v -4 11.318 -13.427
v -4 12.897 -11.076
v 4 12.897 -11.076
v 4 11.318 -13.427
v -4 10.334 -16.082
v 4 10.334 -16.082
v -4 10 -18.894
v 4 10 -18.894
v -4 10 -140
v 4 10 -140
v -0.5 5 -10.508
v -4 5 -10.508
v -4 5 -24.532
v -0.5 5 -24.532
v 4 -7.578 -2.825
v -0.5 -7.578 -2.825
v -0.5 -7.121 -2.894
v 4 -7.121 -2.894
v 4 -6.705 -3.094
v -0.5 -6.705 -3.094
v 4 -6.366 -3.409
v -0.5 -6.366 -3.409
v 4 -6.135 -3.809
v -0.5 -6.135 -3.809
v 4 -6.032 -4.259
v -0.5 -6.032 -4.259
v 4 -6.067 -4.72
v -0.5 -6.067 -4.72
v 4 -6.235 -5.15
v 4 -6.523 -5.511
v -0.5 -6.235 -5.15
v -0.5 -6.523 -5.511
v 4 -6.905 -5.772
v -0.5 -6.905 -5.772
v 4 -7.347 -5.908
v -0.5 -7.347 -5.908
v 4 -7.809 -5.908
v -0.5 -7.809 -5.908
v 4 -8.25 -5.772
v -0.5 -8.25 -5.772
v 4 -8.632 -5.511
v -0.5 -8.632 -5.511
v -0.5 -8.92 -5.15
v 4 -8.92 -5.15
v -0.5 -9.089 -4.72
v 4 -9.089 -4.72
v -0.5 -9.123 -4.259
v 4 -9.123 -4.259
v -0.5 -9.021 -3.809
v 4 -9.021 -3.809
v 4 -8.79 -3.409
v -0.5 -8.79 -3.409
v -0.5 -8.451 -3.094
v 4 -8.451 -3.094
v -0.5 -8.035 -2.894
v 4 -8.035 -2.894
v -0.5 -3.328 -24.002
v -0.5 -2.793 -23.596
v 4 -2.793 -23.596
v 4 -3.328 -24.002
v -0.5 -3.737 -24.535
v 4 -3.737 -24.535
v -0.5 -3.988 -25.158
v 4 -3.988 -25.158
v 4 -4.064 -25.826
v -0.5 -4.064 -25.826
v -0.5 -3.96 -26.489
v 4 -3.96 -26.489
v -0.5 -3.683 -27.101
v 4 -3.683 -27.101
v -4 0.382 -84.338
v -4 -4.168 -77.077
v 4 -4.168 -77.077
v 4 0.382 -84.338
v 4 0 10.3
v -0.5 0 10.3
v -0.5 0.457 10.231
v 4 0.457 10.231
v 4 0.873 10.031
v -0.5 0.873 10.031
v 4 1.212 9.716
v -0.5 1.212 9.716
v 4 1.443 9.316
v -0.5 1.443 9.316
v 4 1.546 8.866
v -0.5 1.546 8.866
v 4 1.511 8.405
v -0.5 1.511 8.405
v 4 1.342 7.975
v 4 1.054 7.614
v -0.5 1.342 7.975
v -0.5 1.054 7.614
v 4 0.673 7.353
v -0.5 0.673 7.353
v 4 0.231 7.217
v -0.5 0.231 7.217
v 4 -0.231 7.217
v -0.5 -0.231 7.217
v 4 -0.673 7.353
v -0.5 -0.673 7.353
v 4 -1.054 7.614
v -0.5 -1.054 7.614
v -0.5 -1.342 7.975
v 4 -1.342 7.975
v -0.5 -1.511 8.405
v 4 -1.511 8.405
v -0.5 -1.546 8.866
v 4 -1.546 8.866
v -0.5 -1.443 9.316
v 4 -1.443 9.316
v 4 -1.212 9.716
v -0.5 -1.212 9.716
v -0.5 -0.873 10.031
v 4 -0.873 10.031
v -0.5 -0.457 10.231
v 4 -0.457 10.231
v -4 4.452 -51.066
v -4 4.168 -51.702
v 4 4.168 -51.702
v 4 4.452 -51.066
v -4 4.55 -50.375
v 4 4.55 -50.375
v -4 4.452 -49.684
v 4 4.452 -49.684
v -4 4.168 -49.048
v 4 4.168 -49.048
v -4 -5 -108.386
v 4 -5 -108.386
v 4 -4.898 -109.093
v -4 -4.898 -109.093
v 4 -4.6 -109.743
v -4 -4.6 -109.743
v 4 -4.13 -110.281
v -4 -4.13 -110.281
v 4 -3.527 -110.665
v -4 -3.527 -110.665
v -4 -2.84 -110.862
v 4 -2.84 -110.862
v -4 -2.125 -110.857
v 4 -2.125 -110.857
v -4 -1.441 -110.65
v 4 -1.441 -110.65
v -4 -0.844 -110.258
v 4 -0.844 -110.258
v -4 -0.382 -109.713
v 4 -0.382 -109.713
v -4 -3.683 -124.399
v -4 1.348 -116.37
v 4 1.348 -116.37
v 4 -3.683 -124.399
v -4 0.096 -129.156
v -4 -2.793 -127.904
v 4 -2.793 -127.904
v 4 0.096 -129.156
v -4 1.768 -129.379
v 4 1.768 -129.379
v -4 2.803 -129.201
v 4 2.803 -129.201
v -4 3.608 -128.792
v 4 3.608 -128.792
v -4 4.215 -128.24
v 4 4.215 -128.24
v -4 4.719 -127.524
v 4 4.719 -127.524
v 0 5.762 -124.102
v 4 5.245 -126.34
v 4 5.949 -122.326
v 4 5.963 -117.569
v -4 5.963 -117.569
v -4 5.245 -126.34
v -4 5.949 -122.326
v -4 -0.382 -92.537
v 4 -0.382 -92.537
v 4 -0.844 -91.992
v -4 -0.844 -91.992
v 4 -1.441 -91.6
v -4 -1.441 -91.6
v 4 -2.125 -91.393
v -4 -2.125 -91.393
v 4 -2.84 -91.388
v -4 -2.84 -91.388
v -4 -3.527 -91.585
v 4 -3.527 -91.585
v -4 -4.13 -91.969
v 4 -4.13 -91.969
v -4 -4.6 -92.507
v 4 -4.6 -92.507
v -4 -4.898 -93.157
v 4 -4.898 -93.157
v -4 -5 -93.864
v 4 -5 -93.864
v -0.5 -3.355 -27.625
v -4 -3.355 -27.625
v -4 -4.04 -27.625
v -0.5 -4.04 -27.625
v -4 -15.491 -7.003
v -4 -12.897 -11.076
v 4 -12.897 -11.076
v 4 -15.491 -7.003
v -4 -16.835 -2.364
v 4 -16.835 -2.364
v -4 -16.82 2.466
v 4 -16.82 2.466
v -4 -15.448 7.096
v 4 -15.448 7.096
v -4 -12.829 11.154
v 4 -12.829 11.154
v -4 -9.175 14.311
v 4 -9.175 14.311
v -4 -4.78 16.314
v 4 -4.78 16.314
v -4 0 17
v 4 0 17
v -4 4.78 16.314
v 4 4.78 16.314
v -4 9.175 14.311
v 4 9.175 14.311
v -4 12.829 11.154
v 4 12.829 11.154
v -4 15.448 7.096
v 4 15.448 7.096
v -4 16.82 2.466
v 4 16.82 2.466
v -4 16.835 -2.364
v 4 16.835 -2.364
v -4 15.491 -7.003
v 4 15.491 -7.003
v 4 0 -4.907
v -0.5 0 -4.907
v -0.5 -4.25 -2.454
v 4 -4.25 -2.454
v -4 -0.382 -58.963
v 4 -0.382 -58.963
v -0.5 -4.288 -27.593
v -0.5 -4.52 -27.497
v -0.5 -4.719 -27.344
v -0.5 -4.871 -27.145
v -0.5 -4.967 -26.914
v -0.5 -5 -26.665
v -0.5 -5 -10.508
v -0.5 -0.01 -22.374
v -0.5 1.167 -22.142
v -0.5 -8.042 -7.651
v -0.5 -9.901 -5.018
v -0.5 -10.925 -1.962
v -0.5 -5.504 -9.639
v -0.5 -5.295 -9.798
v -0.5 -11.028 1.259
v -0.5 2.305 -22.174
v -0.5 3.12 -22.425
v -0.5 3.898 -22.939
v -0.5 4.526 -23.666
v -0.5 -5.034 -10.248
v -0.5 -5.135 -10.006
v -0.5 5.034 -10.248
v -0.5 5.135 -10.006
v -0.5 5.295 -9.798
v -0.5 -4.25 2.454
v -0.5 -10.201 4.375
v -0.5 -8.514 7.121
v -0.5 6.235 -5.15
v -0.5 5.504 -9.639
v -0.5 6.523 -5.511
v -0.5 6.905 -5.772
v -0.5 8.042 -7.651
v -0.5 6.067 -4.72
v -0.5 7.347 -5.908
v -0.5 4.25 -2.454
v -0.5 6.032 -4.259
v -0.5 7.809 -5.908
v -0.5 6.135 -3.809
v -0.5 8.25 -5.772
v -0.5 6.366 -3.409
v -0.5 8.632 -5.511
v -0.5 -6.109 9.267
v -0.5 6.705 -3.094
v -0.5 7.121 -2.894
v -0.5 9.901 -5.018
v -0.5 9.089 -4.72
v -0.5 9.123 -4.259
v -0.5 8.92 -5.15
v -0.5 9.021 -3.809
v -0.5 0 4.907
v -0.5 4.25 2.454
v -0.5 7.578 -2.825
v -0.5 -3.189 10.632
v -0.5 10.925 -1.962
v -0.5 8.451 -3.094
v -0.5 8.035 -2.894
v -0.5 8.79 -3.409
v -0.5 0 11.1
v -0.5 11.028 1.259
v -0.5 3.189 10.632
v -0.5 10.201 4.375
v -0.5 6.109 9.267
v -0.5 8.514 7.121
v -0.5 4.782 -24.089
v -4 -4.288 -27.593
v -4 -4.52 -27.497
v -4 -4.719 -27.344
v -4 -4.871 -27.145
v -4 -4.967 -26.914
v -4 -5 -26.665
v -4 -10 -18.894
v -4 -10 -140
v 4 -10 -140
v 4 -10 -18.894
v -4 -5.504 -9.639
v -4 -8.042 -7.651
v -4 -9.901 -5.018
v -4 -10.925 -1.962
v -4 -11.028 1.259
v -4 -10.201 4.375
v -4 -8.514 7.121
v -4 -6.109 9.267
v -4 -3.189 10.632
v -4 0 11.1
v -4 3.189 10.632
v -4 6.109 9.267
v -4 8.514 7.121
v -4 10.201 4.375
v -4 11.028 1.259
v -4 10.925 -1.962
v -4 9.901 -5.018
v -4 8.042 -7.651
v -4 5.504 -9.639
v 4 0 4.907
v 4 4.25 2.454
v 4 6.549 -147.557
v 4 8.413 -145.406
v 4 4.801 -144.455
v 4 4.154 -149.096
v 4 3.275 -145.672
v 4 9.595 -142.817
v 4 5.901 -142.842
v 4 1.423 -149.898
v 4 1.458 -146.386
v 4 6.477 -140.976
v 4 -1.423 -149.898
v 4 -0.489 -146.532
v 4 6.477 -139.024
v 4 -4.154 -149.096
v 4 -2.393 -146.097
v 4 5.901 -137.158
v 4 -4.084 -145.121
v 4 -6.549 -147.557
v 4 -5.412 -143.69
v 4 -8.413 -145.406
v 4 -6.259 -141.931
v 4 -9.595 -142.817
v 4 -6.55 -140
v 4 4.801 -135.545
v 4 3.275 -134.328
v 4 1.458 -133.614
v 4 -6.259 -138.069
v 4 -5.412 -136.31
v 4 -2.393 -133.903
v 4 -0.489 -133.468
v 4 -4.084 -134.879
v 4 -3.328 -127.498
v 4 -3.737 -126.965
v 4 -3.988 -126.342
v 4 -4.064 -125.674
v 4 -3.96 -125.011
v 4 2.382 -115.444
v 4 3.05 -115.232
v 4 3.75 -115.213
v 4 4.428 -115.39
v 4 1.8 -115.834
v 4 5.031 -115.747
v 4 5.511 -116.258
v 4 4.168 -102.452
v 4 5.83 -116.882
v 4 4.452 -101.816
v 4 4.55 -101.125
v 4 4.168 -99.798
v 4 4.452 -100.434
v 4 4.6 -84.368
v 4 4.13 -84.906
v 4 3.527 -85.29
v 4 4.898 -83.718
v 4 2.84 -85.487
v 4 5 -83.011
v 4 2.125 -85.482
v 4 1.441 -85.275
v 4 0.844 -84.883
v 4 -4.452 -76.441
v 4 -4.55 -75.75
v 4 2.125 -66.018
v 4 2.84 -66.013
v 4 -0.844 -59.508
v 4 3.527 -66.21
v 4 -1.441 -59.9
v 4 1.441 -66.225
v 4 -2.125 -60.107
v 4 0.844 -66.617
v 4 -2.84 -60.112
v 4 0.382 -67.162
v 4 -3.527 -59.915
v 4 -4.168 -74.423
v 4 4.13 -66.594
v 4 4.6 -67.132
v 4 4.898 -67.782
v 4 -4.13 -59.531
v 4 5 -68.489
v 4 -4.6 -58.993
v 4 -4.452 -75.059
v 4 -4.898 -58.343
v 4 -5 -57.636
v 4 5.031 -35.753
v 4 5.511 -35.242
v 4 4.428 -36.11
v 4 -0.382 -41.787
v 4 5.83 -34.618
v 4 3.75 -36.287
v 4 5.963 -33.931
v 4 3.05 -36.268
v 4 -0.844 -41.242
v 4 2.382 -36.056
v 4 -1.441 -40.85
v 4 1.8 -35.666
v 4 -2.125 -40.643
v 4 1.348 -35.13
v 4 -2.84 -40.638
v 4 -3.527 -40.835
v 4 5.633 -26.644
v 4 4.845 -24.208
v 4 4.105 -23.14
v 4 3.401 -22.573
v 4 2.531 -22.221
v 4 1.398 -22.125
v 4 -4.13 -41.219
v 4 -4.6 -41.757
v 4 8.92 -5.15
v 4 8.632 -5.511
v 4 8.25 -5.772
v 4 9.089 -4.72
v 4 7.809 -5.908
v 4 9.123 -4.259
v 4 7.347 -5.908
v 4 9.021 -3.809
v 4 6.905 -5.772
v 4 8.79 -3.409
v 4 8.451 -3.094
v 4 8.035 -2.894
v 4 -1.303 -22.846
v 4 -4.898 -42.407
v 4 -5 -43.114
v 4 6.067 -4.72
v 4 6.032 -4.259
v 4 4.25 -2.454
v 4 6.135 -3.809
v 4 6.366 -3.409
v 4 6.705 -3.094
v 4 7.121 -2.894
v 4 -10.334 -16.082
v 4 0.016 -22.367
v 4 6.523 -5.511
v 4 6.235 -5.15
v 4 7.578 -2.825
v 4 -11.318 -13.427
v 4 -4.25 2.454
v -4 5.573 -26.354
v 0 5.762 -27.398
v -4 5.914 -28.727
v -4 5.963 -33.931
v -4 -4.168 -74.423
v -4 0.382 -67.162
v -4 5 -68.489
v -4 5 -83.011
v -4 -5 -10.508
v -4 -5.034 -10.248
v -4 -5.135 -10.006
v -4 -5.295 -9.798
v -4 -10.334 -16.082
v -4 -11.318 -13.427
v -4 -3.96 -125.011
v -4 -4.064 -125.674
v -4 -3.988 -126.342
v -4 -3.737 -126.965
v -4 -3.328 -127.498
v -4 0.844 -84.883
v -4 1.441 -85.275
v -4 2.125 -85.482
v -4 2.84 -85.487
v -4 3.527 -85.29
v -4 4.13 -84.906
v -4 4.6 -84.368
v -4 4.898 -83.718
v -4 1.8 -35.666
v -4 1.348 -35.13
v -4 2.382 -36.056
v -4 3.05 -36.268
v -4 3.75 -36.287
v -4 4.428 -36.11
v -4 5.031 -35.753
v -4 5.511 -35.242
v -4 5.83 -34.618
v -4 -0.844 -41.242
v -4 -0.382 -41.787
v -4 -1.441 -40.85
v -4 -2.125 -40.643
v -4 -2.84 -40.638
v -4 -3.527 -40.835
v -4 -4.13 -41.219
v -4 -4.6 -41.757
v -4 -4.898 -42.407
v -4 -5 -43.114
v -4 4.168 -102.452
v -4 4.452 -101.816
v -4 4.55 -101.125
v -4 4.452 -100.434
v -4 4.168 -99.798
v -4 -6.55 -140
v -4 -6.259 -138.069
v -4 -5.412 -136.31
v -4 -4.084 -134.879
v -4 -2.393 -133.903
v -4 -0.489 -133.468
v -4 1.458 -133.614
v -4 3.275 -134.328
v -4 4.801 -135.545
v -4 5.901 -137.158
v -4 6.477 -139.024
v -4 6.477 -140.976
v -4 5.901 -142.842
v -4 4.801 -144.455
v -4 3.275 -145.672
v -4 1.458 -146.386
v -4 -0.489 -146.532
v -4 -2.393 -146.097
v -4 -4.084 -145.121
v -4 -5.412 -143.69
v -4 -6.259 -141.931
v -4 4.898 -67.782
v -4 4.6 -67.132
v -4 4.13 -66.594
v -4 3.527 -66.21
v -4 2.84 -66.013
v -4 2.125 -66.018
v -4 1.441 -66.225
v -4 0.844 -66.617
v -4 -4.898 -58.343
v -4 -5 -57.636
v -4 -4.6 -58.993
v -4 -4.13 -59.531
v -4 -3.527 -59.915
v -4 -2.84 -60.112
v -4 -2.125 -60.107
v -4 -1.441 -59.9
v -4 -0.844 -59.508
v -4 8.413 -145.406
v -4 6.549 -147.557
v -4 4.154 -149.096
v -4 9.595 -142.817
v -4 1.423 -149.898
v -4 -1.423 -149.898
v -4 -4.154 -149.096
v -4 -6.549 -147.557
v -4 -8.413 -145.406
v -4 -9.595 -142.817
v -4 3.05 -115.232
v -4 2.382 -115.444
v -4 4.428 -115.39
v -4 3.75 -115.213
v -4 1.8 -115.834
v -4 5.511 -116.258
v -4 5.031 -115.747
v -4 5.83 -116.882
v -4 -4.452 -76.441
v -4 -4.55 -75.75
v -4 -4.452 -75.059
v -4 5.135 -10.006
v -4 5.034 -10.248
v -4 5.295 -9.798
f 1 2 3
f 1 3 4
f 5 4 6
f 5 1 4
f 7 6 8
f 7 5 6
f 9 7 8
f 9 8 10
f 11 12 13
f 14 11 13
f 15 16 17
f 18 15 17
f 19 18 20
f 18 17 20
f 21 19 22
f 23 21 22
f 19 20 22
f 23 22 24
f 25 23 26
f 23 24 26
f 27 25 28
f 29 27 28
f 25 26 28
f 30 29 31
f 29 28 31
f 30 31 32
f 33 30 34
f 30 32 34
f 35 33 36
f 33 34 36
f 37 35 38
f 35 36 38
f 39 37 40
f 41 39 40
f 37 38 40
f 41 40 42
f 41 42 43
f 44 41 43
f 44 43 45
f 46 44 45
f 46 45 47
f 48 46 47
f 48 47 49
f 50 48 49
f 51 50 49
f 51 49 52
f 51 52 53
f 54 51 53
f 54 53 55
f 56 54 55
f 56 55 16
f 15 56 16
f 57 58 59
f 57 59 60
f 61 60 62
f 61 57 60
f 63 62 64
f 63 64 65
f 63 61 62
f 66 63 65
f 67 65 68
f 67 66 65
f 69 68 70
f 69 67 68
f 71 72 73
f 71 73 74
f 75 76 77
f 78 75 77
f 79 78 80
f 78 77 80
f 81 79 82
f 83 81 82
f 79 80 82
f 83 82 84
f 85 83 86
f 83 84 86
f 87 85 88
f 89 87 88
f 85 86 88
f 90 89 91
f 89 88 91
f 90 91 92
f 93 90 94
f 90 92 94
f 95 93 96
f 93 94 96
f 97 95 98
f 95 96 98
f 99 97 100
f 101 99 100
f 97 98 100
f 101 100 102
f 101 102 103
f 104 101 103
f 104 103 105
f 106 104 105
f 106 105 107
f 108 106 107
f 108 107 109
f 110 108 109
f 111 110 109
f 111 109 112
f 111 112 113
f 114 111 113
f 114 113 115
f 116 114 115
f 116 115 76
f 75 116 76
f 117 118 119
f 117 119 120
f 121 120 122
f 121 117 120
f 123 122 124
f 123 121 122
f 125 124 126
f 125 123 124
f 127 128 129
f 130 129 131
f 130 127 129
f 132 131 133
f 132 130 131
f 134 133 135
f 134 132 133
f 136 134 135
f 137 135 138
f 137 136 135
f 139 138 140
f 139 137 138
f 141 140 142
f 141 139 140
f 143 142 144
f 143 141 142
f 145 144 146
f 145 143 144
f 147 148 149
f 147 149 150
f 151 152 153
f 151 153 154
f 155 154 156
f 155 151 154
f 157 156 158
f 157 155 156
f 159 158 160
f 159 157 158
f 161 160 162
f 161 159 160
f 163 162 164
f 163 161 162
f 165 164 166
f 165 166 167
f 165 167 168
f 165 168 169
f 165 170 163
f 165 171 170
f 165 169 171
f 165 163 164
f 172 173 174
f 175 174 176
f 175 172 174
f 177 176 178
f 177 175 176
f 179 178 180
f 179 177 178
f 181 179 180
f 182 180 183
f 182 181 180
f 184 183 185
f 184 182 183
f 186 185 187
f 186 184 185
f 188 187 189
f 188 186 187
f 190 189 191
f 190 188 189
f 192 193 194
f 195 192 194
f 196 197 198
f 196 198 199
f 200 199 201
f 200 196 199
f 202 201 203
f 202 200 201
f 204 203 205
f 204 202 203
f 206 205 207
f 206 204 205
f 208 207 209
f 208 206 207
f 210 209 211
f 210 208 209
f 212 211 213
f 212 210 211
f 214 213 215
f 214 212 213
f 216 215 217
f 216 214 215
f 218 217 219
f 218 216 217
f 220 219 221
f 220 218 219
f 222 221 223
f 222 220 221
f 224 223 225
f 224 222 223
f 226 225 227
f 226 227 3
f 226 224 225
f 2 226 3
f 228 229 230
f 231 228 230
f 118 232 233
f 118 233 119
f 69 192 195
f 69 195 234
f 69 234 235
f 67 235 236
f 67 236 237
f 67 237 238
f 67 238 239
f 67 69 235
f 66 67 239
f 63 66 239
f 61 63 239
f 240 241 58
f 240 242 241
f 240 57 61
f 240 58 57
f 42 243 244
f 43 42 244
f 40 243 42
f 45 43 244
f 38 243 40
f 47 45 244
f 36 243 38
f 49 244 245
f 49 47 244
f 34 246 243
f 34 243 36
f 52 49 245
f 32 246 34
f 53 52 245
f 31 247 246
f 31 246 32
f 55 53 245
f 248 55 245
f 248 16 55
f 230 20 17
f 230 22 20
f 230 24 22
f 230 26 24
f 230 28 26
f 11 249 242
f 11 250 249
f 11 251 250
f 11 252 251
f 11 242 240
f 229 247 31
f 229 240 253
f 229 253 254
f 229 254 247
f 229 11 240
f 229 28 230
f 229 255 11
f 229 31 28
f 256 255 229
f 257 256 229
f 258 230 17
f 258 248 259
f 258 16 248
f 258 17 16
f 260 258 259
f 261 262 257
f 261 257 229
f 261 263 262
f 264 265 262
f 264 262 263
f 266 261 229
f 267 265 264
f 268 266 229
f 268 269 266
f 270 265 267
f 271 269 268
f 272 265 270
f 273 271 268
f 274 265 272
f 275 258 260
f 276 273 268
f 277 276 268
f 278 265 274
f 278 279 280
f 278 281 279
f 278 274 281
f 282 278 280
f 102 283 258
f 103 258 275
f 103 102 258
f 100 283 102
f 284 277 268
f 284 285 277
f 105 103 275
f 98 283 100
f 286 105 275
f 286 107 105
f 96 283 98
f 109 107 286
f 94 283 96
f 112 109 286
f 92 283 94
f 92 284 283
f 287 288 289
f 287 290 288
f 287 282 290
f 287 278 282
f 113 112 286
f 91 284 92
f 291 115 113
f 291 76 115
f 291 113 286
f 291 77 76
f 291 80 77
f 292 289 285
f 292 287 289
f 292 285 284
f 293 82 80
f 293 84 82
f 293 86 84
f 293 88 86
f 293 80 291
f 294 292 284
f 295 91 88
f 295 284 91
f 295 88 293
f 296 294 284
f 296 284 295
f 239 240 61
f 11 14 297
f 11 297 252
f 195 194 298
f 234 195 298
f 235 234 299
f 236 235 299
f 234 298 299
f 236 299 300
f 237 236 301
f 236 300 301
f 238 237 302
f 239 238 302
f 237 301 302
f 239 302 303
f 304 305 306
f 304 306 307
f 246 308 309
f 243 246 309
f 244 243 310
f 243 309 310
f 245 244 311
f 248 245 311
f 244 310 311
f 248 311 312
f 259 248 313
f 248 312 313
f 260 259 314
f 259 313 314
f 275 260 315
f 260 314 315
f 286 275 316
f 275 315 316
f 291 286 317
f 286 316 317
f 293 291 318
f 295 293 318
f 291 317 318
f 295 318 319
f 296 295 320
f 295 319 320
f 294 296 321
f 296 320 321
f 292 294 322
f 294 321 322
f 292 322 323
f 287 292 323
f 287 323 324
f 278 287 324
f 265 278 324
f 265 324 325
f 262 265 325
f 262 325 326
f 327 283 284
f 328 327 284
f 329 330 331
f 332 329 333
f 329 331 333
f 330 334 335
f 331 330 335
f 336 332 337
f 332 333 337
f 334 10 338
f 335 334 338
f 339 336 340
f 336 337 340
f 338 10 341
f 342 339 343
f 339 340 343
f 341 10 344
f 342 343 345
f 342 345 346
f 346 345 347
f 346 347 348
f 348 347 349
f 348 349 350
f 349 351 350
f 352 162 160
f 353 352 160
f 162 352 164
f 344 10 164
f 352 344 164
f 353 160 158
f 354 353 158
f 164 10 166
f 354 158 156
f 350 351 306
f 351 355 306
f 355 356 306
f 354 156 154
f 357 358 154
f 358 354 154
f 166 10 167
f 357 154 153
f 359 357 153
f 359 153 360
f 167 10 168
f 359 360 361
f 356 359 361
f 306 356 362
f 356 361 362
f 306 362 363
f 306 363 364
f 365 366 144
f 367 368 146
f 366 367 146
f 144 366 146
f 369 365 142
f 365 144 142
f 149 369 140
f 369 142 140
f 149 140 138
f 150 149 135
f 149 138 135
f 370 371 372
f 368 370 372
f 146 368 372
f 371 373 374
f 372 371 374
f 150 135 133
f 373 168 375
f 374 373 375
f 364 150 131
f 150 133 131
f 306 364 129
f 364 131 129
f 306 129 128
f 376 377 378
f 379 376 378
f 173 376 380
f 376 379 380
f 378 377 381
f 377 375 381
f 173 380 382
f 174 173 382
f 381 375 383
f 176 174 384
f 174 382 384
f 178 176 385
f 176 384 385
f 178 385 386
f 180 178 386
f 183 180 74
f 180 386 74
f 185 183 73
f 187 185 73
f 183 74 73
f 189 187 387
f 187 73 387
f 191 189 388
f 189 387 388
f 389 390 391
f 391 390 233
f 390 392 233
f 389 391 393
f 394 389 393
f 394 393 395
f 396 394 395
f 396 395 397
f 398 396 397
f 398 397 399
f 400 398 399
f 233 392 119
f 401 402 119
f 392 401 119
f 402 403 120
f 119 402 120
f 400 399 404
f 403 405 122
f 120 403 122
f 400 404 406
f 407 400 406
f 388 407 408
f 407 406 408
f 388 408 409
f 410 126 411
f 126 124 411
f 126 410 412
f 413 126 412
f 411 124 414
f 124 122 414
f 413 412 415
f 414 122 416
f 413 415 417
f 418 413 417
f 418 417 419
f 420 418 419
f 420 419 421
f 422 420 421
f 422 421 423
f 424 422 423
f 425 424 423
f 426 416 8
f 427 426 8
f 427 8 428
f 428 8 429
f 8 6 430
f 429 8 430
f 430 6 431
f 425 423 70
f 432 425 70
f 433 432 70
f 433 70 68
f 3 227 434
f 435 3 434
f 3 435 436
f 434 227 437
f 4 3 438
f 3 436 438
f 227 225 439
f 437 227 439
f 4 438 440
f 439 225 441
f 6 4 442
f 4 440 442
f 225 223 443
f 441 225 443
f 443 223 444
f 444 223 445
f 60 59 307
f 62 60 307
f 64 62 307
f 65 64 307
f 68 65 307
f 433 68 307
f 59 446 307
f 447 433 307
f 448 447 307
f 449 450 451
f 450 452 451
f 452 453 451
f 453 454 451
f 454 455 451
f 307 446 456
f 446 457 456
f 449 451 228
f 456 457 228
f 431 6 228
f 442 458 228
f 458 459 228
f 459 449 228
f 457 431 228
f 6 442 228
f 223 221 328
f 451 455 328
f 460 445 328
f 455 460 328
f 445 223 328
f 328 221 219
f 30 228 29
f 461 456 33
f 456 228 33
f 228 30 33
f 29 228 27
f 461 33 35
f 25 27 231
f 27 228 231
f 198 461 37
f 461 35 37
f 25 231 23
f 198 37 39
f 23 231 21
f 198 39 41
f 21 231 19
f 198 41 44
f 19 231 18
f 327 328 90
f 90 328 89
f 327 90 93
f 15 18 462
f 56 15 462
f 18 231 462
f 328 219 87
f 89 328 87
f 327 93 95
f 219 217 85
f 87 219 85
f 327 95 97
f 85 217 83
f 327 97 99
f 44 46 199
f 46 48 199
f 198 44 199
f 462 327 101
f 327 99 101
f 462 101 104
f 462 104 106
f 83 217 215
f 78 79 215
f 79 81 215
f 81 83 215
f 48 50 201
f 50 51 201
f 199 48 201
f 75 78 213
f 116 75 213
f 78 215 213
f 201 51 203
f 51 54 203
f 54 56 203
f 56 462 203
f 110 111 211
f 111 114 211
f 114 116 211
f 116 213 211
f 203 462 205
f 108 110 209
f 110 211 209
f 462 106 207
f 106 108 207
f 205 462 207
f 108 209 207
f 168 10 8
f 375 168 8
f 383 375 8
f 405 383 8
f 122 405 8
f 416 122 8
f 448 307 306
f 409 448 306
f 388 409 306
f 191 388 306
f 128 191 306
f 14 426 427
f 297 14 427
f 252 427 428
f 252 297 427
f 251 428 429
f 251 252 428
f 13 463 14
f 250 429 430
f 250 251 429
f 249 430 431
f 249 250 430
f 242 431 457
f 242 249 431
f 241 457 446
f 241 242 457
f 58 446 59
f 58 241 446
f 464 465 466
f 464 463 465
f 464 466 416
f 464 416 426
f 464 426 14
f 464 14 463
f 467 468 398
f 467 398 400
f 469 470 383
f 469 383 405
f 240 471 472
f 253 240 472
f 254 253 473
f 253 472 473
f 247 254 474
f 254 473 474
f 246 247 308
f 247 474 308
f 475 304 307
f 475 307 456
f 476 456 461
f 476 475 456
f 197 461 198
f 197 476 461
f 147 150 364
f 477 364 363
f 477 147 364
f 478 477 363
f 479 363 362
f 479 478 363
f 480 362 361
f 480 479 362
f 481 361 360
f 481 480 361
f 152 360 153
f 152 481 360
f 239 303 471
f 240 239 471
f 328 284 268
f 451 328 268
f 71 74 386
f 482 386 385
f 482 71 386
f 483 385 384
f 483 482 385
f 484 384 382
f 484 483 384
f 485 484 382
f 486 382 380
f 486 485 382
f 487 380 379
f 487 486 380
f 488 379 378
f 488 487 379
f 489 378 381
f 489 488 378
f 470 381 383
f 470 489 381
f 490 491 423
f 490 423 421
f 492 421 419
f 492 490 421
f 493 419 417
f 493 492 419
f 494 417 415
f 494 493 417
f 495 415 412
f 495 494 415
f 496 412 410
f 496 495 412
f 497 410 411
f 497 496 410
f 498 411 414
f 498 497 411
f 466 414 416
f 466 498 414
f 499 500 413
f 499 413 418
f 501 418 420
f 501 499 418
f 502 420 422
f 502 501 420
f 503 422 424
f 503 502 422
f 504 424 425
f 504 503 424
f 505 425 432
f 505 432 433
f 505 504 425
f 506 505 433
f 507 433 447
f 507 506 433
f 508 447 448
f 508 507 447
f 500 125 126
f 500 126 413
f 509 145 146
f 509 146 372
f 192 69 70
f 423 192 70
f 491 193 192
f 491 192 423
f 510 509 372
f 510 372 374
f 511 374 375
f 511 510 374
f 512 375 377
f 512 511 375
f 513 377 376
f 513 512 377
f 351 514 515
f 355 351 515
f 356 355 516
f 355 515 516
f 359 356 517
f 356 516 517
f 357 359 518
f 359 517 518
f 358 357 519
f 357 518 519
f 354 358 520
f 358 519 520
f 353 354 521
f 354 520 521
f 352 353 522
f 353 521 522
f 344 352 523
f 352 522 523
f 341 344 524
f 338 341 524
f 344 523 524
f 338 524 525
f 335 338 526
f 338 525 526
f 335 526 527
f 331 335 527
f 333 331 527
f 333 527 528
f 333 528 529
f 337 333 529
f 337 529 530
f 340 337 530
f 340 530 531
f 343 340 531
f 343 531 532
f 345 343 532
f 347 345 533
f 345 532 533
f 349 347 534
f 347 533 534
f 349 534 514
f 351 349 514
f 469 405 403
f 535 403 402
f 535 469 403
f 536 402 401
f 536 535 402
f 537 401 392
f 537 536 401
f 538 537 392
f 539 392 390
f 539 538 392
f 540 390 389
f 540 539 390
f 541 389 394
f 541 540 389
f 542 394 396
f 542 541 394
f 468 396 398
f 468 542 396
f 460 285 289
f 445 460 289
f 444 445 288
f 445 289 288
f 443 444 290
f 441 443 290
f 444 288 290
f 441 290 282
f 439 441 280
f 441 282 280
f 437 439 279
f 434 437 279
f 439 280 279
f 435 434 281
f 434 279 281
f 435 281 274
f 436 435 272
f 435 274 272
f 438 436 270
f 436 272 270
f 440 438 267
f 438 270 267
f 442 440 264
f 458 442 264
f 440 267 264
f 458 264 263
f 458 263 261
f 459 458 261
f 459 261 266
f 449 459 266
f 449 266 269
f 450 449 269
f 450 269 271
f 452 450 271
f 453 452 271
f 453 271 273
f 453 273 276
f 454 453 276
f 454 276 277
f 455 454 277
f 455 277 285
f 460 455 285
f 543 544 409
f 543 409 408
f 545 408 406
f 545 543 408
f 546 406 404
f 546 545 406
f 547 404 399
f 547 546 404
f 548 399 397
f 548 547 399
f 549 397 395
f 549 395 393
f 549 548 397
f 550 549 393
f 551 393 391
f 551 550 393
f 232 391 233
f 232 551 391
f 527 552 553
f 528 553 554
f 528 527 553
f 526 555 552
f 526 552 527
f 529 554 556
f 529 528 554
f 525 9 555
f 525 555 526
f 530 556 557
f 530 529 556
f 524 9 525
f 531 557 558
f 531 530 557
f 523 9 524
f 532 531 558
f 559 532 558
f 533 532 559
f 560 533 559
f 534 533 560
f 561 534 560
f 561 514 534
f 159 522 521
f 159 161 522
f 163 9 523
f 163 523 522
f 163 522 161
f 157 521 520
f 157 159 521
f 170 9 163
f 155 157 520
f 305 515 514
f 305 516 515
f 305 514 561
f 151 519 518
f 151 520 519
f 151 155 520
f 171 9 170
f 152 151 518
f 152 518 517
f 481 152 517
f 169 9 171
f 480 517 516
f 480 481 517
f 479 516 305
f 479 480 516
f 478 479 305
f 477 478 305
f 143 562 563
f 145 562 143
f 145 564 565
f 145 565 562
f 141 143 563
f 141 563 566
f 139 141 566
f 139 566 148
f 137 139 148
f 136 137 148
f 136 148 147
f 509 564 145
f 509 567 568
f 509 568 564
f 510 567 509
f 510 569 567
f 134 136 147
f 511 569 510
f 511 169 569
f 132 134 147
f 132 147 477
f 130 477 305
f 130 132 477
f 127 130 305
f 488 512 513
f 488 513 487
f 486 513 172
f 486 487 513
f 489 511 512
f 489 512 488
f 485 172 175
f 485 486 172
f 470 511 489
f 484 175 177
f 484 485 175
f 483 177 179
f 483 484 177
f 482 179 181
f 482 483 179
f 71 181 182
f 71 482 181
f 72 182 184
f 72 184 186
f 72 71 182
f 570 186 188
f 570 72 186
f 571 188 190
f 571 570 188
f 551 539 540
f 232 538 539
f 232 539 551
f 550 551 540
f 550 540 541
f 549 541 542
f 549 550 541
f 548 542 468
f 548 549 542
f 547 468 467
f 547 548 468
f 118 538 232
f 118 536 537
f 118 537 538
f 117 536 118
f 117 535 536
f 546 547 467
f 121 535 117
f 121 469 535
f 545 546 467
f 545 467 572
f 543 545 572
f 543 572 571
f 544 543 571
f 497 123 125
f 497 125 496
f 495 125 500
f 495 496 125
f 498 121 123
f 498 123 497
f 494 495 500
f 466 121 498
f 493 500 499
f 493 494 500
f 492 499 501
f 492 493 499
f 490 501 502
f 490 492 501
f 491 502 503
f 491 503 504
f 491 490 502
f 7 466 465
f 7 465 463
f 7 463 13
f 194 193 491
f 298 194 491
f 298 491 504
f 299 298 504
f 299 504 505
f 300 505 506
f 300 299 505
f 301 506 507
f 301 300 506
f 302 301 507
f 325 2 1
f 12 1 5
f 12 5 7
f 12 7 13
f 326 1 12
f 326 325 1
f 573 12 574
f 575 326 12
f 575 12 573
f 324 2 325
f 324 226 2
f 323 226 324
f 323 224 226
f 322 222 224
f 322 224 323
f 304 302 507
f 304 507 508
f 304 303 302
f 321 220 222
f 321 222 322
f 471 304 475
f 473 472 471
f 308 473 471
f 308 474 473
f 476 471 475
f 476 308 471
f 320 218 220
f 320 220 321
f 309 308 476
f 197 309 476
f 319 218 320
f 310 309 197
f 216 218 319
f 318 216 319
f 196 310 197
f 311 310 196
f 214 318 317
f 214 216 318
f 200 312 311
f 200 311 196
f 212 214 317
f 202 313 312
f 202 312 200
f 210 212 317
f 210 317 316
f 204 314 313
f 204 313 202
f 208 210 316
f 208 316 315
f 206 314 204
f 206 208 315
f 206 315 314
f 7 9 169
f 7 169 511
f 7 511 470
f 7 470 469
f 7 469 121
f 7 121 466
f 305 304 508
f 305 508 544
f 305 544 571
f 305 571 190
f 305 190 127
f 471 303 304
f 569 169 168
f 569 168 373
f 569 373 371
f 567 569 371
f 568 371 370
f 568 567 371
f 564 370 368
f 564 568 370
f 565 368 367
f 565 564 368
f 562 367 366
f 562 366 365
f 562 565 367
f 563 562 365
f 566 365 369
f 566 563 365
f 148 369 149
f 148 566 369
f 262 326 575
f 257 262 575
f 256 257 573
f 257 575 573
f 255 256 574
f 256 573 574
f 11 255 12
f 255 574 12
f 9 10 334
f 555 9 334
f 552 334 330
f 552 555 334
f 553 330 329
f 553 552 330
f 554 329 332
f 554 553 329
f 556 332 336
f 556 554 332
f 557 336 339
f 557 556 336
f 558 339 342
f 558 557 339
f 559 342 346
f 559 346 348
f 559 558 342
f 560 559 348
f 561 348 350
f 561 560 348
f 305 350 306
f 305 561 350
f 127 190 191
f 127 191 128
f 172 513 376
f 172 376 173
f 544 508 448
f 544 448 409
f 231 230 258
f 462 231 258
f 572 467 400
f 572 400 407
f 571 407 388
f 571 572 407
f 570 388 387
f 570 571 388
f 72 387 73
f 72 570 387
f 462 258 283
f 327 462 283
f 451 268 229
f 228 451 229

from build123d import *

# Parameters (mm, degrees)
SKETCH_1_R          = 6.55
EXTRUDE_1_DEPTH     = 8
CUT_EXTRUDE_1_DEPTH = 3.5
SKETCH_3_R          = 1.55
CUT_EXTRUDE_2_DEPTH = 5.5000001


with BuildPart() as part:
    # 草图1 → 凸台-拉伸1 (new body)
    with BuildSketch(Plane(origin=(-4, 0, 0), x_dir=(0, -1, 0), z_dir=(-1, 0, 0))):
        with BuildLine():
            Line((-10, -18.894443628), (-10, -140))
            ThreePointArc((-10, -140), (0, -150), (10, -140))
            Line((10, -140), (10, -18.894443628))
            ThreePointArc((10, -18.894443628), (10.74741409, -14.725593625), (12.896551724, -11.076053161))
            ThreePointArc((12.896551724, -11.076053161), (0, 17), (-12.896551724, -11.076053161))
            ThreePointArc((-12.896551724, -11.076053161), (-10.74741409, -14.725593625), (-10, -18.894443628))
        make_face()
        with Locations((0, -140)):
            Circle(SKETCH_1_R, mode=Mode.SUBTRACT)
        with BuildLine():
            Line((-4.168179012, -99.797532142), (0.381550311, -92.536811957))
            ThreePointArc((0.381550311, -92.536811957), (3.190606899, -91.461560083), (5, -93.864279815))
            Line((5, -93.864279815), (5, -108.385720185))
            ThreePointArc((5, -108.385720185), (3.190606899, -110.788439917), (0.381550311, -109.713188043))
            Line((0.381550311, -109.713188043), (-4.168179012, -102.452467858))
            ThreePointArc((-4.168179012, -102.452467858), (-4.549729323, -101.125), (-4.168179012, -99.797532142))
        make_face(mode=Mode.SUBTRACT)
        with BuildLine():
            Line((-1.347932676, -116.369603301), (3.683273316, -124.398691695))
            ThreePointArc((3.683273316, -124.398691695), (3.98786354, -126.341689874), (2.792876182, -127.903746961))
            add(Edge.make_bspline(
                [(2.792876182, -127.903746961), (-2.877603269, -131.101619406), (-5.985402229, -127.808170374), (-6.076762251, -119.793304589), (-5.963124704, -117.569487096)],
                knots=[0.005408839, 0.005408839, 0.005408839, 0.005408839, 0.693539789, 0.980498212, 0.980498212, 0.980498212, 0.980498212], degree=3))
            ThreePointArc((-5.963124704, -117.569487096), (-4.09543452, -115.277506448), (-1.347932676, -116.369603301))
        make_face(mode=Mode.SUBTRACT)
        with BuildLine():
            Line((0.381550311, -58.963188043), (-4.168179012, -51.702467858))
            ThreePointArc((-4.168179012, -51.702467858), (-4.549729323, -50.375), (-4.168179012, -49.047532142))
            Line((-4.168179012, -49.047532142), (0.381550311, -41.786811957))
            ThreePointArc((0.381550311, -41.786811957), (3.190606899, -40.711560083), (5, -43.114279815))
            Line((5, -43.114279815), (5, -57.635720185))
            ThreePointArc((5, -57.635720185), (3.190606899, -60.038439917), (0.381550311, -58.963188043))
        make_face(mode=Mode.SUBTRACT)
        with BuildLine():
            Line((3.683273317, -27.101308304), (-1.347932676, -35.130396699))
            ThreePointArc((-1.347932676, -35.130396699), (-4.095434519, -36.222493552), (-5.963124704, -33.930512906))
            add(Edge.make_bspline(
                [(-5.963124704, -33.930512906), (-6.076762251, -31.706695412), (-5.98540223, -23.691829624), (-2.877603269, -20.398380591), (2.792876182, -23.596253037)],
                knots=[0.005408839, 0.005408839, 0.005408839, 0.005408839, 0.292367263, 0.980498213, 0.980498213, 0.980498213, 0.980498213], degree=3))
            ThreePointArc((2.792876182, -23.596253037), (3.987863541, -25.158310124), (3.683273317, -27.101308304))
        make_face(mode=Mode.SUBTRACT)
        with BuildLine():
            Line((4.168179012, -77.077467858), (-0.381550311, -84.338188043))
            ThreePointArc((-0.381550311, -84.338188043), (-3.190606899, -85.413439917), (-5, -83.010720185))
            Line((-5, -83.010720185), (-5, -68.489279815))
            ThreePointArc((-5, -68.489279815), (-3.190606899, -66.086560083), (-0.381550311, -67.161811957))
            Line((-0.381550311, -67.161811957), (4.168179012, -74.422532142))
            ThreePointArc((4.168179012, -74.422532142), (4.549729323, -75.75), (4.168179012, -77.077467858))
        make_face(mode=Mode.SUBTRACT)
    extrude(amount=-EXTRUDE_1_DEPTH)

    # 草图2 → 切除-拉伸1 (cut)
    with BuildSketch(Plane.ZY.offset(4)):
        with BuildLine():
            Line((-23.794604197, 5), (-27.625420737, 5))
            Line((-27.625420737, 5), (-27.625420737, -4.039591784))
            ThreePointArc((-27.625420737, -4.039591784), (-27.344123683, -4.718702946), (-26.665012521, -5))
            Line((-26.665012521, -5), (-23.794604197, -5))
            Line((-23.794604197, -5), (-10.507616285, -5))
            ThreePointArc((-10.507616285, -5), (-10.005554421, -5.135168291), (-9.639218245, -5.504132231))
            ThreePointArc((-9.639218245, -5.504132231), (11.1, 0), (-9.639218245, 5.504132231))
            ThreePointArc((-9.639218245, 5.504132231), (-10.005554421, 5.135168291), (-10.507616285, 5))
            Line((-10.507616285, 5), (-23.794604197, 5))
        make_face()
    extrude(amount=-CUT_EXTRUDE_1_DEPTH, mode=Mode.SUBTRACT)

    # 草图3 → 切除-拉伸2 (cut, through all)
    with BuildSketch(Plane.ZY.offset(0.5)):
        with Locations((-4.375, 7.577722283)):
            Circle(SKETCH_3_R)
        with Locations((-4.375, -7.577722283)):
            Circle(SKETCH_3_R)
        with Locations((8.75, 0)):
            Circle(SKETCH_3_R)
        Polygon((4.907477288, 0), (2.453738644, 4.25), (-2.453738644, 4.25), (-4.907477288, 0), (-2.453738644, -4.25), (2.453738644, -4.25), align=None)
    extrude(amount=-CUT_EXTRUDE_2_DEPTH, mode=Mode.SUBTRACT)


solid = part.part
